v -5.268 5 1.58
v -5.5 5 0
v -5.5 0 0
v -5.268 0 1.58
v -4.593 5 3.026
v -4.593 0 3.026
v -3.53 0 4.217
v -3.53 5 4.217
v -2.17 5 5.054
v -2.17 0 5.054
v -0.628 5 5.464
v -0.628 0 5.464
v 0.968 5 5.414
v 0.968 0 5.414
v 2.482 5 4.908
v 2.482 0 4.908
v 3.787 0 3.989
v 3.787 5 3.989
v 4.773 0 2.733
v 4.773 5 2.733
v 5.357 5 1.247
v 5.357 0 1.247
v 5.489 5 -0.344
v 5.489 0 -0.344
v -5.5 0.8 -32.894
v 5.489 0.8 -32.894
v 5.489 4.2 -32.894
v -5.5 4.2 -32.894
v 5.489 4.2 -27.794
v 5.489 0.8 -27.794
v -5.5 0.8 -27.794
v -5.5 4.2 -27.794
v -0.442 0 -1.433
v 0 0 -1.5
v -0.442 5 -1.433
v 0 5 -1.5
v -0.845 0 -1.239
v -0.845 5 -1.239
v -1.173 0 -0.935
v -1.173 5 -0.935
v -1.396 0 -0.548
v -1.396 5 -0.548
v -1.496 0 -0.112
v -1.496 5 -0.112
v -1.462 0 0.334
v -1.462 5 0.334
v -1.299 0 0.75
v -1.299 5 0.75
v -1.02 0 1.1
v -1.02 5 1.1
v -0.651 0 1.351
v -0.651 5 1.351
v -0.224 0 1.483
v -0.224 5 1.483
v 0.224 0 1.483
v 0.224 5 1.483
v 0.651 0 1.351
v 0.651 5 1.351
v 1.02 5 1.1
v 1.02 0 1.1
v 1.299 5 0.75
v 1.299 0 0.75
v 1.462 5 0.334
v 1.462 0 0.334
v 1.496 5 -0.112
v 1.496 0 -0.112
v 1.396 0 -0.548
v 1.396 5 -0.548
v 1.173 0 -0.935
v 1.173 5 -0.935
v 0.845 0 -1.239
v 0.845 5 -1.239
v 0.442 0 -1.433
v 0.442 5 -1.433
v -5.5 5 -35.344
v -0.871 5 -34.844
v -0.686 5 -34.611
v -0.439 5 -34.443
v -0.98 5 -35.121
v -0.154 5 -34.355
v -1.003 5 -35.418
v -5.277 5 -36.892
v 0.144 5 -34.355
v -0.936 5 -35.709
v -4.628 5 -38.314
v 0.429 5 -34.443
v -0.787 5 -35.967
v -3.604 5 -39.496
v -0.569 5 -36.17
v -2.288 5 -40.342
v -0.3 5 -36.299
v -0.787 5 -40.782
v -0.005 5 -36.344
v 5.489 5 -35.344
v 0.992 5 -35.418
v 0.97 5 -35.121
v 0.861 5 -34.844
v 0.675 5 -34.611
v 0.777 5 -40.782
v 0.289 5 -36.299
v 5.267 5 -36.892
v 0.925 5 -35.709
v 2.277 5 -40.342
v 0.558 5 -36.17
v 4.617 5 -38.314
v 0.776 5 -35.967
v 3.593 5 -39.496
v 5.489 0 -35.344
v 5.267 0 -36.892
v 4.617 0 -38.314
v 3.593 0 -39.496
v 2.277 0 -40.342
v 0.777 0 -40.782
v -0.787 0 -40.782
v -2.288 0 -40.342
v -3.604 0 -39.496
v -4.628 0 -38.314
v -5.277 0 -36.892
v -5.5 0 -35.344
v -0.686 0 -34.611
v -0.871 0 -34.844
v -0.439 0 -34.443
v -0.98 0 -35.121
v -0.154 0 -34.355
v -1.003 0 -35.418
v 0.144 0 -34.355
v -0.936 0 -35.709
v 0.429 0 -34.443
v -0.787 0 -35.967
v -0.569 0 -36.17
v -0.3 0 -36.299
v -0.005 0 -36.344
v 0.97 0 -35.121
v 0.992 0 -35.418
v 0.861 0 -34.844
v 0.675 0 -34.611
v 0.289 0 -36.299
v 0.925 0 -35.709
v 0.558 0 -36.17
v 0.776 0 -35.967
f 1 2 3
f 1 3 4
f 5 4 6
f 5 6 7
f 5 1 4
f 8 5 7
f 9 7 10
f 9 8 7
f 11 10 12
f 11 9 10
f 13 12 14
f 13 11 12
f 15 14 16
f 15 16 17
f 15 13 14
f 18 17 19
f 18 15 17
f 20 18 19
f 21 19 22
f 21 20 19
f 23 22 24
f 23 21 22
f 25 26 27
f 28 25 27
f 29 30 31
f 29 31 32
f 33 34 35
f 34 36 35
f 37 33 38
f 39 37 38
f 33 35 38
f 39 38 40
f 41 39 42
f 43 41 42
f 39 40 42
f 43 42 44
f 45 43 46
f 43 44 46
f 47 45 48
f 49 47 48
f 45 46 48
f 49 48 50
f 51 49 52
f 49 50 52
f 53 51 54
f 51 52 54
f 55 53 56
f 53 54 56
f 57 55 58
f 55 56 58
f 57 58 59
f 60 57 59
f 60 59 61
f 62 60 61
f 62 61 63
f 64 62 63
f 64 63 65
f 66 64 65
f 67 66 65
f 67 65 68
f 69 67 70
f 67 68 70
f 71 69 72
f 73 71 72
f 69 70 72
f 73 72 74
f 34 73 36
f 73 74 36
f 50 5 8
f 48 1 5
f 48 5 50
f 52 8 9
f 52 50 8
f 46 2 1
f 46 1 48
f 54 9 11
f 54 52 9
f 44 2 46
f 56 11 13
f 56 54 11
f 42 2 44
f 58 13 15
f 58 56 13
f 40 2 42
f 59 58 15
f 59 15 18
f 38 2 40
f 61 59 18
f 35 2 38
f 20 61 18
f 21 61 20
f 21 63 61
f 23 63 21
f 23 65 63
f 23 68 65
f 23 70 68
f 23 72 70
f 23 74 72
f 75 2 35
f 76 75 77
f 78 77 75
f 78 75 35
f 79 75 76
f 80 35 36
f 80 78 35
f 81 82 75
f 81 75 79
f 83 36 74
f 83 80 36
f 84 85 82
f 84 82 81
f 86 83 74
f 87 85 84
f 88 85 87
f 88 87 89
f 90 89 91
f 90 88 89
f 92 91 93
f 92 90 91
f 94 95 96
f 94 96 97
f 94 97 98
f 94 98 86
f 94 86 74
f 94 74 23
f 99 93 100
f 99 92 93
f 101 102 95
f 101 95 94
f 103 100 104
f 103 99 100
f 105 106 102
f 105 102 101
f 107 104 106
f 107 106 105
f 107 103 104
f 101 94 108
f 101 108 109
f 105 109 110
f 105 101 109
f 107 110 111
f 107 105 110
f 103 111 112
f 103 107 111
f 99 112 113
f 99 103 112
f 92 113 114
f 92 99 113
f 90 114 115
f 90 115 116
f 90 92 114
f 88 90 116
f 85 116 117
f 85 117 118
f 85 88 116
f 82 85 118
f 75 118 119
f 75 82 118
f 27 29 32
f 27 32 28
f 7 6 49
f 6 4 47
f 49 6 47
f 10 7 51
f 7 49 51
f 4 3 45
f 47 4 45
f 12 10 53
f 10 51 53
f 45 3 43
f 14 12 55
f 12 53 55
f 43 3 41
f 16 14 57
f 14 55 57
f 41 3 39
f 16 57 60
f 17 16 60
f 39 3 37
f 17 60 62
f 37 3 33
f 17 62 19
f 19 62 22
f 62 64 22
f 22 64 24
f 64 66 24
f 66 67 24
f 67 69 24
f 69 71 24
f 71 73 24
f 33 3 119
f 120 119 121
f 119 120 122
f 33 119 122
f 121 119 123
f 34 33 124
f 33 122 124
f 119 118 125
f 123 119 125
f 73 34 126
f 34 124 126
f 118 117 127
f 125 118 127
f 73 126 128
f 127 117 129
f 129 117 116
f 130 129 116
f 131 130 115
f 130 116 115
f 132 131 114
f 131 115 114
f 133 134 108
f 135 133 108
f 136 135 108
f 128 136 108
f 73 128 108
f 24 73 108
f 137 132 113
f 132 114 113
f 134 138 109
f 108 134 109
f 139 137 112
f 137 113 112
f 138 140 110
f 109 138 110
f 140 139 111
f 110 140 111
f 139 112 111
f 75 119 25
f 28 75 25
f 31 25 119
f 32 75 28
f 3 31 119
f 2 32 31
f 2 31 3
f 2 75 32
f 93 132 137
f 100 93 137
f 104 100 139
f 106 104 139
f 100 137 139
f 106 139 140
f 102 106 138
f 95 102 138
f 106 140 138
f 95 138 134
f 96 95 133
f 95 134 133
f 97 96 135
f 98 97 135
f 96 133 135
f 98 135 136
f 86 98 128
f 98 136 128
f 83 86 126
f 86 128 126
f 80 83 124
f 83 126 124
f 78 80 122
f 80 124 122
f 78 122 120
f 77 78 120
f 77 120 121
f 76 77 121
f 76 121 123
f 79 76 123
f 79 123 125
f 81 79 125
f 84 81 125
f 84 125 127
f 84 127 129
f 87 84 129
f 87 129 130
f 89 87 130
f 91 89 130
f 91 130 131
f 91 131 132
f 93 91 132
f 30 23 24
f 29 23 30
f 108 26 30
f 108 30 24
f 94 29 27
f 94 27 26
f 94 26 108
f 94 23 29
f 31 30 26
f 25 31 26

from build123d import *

# Parameters (mm, degrees)
EXTRUDE_START       = -3
EXTRUDE_1_DEPTH     = 3
SKETCH_4_R          = 1
CUT_EXTRUDE_1_DEPTH = 5
EXTRUDE_3_DEPTH     = 2
CUT_EXTRUDE_START   = 10
SKETCH_4_2_R        = 1
CUT_EXTRUDE_2_DEPTH = 10
SKETCH_6_W          = 5.1
SKETCH_6_H          = 3.4
CUT_EXTRUDE_3_DEPTH = 43.585635121


with BuildPart() as part:
    # 草图1 → 旋转1 (revolve)
    with BuildSketch(Plane.XY, mode=Mode.PRIVATE) as revolve_1_sk:
        Polygon((-2.4, 0), (-5.5, 0), (-5.5, 5), (-4.25, 5), (-1.5, 5), (-1.5, 3.8), (-1.5, 2.66), (-1.5, 0), align=None)
    revolve(revolve_1_sk.sketch.rotate(Axis((0, 0, 0), (0, 1, 0)), 270), axis=Axis((0, 0, 0), (0, 1, 0)))

    # 草图2 → 凸台-拉伸1 (add)
    with BuildSketch(Plane(origin=(0, 2, 0), x_dir=(-1, 0, 0), z_dir=(0, -1, 0)).offset(EXTRUDE_START)):
        with BuildLine():
            Line((-5.489247302, 0.34375), (-5.489247302, 35.34375))
            ThreePointArc((-5.489247302, 35.34375), (0.005376349, 40.838373651), (5.5, 35.34375))
            Line((5.5, 35.34375), (5.5, 0))
            ThreePointArc((5.5, 0), (0.171959067, 5.497311168), (-5.489247302, 0.34375))
        make_face()
    extrude(amount=EXTRUDE_1_DEPTH)

    # 草图4 → 切除-拉伸1 (cut, symmetric)
    with BuildSketch(Plane.XZ.offset(-2)):
        with Locations(Location((-0.005376349, -35.34375, 0), (0, 0, 270))):
            Circle(SKETCH_4_R)
    extrude(amount=CUT_EXTRUDE_1_DEPTH, both=True, mode=Mode.SUBTRACT)

    # 草图2<2> → 凸台-拉伸3 (add)
    with BuildSketch(Plane(origin=(0, 2, 0), x_dir=(-1, 0, 0), z_dir=(0, -1, 0))):
        with BuildLine():
            Line((-5.489247302, 0.34375), (-5.489247302, 35.34375))
            ThreePointArc((-5.489247302, 35.34375), (0.005376349, 40.838373651), (5.5, 35.34375))
            Line((5.5, 35.34375), (5.5, 0))
            ThreePointArc((5.5, 0), (0.171959067, 5.497311168), (-5.489247302, 0.34375))
        make_face()
    extrude(amount=EXTRUDE_3_DEPTH)

    # 草图4<2> → 切除-拉伸2 (cut)
    with BuildSketch(Plane.XZ.offset(-2).offset(CUT_EXTRUDE_START)):
        with Locations(Location((-0.005376349, -35.34375, 0), (0, 0, 270))):
            Circle(SKETCH_4_2_R)
    extrude(amount=-CUT_EXTRUDE_2_DEPTH, mode=Mode.SUBTRACT)

    # 草图6 → 切除-拉伸3 (cut, through all)
    with BuildSketch(Plane(origin=(5.489247302, 0, 0), x_dir=(0, 0, -1), z_dir=(1, 0, 0))):
        with Locations((30.34375, 2.5)):
            Rectangle(SKETCH_6_W, SKETCH_6_H)
    extrude(amount=-CUT_EXTRUDE_3_DEPTH, mode=Mode.SUBTRACT)


solid = part.part
